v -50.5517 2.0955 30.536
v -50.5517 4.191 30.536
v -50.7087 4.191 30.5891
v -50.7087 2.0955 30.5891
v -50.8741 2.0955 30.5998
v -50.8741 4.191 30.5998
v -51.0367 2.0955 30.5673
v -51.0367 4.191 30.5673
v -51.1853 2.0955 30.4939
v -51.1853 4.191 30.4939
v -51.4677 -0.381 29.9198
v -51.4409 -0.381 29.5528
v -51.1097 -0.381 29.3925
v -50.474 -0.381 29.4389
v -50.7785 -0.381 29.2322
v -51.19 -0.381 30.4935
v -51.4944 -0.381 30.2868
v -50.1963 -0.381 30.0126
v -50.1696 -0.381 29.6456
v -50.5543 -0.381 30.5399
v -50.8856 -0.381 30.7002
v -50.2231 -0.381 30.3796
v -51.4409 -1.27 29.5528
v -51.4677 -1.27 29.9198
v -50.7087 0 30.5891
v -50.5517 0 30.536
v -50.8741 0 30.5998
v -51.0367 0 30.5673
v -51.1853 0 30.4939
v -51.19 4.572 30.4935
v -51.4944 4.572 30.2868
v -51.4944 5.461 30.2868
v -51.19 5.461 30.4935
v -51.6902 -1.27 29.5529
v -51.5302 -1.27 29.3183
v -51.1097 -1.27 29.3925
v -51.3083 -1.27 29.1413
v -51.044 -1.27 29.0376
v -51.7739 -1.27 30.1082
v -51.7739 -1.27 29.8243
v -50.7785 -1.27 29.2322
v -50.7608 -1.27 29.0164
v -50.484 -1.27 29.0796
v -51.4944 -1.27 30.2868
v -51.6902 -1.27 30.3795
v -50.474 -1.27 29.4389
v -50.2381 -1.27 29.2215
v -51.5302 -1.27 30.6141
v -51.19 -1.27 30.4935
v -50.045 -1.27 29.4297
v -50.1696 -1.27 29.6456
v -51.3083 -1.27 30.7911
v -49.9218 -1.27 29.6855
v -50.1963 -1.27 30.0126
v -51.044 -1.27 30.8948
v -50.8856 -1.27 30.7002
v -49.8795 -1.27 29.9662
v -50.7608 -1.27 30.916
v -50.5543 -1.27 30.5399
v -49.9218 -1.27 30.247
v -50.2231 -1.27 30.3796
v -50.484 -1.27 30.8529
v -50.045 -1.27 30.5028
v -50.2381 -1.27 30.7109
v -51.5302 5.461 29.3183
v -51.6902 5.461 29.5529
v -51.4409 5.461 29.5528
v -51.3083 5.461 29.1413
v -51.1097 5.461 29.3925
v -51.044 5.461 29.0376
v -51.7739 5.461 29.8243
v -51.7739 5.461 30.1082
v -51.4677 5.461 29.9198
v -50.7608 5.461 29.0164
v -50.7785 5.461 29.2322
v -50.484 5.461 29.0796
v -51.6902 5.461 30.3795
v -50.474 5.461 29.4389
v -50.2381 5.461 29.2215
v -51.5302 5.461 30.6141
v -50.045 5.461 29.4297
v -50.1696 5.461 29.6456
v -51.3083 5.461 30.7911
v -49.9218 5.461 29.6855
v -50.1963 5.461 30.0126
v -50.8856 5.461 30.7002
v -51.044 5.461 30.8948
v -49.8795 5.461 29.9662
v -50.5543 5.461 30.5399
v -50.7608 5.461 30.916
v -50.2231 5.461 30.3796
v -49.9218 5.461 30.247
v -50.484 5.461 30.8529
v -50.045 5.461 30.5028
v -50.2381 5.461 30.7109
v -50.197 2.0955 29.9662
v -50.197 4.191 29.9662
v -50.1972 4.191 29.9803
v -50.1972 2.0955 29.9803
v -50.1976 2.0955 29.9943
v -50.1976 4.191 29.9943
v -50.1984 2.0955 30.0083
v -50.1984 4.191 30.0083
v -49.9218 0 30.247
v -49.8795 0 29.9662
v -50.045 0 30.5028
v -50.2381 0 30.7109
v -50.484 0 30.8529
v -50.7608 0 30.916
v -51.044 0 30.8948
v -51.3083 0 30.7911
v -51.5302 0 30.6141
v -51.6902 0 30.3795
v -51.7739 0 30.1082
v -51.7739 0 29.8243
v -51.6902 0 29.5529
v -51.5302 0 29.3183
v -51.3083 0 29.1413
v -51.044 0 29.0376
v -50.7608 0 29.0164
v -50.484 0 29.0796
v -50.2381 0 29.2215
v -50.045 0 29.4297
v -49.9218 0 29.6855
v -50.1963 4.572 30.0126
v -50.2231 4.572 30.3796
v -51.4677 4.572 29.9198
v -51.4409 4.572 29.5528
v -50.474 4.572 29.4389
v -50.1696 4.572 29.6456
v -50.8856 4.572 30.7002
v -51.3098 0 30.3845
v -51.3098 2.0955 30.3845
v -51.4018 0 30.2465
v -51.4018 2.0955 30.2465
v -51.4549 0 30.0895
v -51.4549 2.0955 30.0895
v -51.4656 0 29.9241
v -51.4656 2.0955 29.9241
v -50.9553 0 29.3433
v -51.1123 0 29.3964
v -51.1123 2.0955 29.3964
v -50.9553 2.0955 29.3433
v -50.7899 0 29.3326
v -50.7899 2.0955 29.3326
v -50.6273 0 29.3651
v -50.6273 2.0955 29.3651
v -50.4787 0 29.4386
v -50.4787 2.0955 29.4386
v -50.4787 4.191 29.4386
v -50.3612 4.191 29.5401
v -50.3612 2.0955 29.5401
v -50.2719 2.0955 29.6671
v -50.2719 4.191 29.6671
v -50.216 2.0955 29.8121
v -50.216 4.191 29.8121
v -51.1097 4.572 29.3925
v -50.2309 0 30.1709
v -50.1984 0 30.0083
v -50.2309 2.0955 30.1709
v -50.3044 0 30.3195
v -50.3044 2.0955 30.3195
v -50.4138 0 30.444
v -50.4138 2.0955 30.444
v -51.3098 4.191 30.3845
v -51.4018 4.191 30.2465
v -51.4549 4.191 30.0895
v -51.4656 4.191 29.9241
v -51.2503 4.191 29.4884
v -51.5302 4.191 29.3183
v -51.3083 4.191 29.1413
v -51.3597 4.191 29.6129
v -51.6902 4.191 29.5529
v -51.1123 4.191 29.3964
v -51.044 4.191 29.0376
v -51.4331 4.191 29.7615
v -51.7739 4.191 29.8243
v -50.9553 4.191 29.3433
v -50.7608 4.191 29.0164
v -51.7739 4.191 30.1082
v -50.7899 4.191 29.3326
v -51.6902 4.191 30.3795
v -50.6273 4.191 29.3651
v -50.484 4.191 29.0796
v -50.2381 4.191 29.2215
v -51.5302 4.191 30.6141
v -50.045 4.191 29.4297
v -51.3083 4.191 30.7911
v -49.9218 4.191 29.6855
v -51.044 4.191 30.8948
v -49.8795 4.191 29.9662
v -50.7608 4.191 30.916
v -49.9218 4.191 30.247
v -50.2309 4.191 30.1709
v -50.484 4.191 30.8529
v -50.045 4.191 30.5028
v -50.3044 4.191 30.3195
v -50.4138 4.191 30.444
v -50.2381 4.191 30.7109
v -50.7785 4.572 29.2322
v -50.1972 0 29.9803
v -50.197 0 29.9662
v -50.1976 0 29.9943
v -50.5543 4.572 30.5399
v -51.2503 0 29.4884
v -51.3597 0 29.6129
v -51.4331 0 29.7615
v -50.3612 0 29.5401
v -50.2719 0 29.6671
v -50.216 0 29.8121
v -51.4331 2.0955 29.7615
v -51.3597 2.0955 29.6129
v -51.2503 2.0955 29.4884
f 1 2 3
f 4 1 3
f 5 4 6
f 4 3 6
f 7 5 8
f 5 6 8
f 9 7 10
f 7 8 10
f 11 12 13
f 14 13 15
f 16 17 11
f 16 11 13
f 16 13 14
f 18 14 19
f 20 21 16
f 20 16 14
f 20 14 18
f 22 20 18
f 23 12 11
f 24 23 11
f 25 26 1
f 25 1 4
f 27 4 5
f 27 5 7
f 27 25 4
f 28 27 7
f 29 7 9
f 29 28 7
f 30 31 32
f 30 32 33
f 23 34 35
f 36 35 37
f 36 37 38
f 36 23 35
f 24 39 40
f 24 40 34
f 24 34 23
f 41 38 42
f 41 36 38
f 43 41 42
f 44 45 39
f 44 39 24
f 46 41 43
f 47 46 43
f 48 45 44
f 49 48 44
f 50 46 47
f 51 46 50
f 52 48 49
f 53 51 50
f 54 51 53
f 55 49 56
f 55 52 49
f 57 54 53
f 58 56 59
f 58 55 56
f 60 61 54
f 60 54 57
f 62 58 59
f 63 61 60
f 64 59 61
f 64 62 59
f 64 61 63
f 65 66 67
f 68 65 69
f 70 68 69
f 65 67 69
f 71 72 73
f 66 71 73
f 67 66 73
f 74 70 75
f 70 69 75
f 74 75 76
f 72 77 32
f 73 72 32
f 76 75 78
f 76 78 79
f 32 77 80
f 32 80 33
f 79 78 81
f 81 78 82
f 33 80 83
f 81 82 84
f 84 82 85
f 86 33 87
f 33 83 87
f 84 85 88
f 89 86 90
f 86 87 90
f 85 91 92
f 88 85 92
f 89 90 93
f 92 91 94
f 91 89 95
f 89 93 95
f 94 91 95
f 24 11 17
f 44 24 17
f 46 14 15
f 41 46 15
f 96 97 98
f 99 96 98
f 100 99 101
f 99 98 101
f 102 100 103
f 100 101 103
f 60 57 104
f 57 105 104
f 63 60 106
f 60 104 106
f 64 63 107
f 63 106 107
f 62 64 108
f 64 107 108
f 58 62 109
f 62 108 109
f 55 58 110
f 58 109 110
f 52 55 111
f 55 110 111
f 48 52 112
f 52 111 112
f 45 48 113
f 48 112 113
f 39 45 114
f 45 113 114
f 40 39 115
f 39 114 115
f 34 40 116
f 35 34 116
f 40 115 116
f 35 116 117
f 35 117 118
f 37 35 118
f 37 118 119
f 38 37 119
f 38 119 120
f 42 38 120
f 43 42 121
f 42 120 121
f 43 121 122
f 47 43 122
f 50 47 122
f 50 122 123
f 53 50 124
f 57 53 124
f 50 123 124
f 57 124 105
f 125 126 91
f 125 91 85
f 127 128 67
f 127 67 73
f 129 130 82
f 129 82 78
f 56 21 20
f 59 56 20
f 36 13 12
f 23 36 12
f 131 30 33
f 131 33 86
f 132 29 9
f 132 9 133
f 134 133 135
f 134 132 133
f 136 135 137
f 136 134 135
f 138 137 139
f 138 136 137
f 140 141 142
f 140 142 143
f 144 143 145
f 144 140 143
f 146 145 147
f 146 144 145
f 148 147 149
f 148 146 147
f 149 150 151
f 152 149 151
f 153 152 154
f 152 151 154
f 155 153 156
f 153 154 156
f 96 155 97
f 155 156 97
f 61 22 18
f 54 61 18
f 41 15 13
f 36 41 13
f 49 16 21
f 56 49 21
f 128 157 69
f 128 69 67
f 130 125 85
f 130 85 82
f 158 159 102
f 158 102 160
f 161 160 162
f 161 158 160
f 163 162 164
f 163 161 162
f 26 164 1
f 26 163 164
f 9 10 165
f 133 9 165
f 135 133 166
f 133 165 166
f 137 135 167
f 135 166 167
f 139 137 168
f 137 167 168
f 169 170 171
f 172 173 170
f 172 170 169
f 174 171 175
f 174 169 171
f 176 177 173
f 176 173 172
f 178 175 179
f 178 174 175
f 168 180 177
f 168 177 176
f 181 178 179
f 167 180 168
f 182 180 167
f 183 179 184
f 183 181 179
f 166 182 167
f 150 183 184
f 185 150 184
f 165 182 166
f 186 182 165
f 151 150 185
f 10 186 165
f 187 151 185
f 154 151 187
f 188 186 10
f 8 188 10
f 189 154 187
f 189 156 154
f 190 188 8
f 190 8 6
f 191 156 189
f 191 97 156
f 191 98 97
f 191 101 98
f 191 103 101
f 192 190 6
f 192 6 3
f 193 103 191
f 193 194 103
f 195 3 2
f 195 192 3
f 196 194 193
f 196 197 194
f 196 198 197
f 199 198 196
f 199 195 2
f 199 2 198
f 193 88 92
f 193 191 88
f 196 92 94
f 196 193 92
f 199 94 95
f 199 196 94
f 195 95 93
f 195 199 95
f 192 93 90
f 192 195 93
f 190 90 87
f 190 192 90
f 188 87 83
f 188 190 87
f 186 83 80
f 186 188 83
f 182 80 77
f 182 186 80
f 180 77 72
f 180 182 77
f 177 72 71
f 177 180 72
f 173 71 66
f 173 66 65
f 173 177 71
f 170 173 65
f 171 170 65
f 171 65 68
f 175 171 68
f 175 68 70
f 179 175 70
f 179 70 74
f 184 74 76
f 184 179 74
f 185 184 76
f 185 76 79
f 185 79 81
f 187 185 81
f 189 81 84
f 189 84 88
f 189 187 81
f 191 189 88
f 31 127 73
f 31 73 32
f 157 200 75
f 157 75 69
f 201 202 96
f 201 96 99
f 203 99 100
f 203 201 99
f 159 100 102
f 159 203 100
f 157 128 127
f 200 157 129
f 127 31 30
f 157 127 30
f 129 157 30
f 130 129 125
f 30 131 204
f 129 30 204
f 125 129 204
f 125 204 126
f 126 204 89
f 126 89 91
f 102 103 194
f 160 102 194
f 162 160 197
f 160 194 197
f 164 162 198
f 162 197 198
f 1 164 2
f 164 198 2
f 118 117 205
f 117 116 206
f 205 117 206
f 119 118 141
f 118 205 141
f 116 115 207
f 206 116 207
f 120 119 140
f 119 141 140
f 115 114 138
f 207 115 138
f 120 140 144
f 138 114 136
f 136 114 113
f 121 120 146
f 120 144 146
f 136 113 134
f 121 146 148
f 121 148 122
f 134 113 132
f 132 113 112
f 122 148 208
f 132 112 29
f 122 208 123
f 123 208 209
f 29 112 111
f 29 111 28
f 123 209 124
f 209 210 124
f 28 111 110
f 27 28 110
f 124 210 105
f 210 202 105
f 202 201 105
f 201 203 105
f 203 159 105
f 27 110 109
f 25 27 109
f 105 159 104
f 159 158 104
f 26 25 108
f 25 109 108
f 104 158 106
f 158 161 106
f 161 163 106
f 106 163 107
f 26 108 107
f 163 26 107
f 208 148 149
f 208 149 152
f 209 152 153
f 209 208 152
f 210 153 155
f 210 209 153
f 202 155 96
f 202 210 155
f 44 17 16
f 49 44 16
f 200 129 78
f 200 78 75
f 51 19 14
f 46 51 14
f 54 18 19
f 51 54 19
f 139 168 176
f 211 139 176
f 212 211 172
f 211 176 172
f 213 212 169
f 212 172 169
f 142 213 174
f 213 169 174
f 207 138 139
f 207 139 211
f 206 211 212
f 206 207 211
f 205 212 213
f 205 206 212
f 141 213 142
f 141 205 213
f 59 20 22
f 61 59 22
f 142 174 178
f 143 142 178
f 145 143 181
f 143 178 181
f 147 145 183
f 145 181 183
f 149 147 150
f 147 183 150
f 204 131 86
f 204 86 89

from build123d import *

# Parameters (mm, degrees)
F1_DEPTH = 2.0955
F0_R     = 0.9525
F2_DEPTH = 0.381
F3_R     = 0.9525
F4_DEPTH = 0.889


with BuildPart() as f1:
    # F0 (on Front) → F1 (new body)
    with BuildSketch(Plane.XZ):
        with BuildLine():
            ThreePointArc((-50.4787408751, 29.4385525432), (-50.27185395, 29.6671320557), (-50.1970108056, 29.9662128091))
            ThreePointArc((-50.1970108056, 29.9662128091), (-50.1973603622, 29.9872797188), (-50.1984086471, 30.0083234346))
            ThreePointArc((-50.1984086471, 30.0083234346), (-50.3043505199, 30.31948271), (-50.5516784903, 30.5359836341))
            ThreePointArc((-50.5516784903, 30.5359836341), (-50.8741213768, 30.5998149712), (-51.1852807654, 30.4938730554))
            ThreePointArc((-51.1852807654, 30.4938730554), (-51.4017816859, 30.246545012), (-51.4656129641, 29.9241021836))
            ThreePointArc((-51.4656129641, 29.9241021836), (-51.3596710927, 29.6129429103), (-51.1123431255, 29.3964419864))
            ThreePointArc((-51.1123431255, 29.3964419864), (-50.7899002546, 29.3326106457), (-50.4787408751, 29.4385525432))
        make_face()
    extrude(amount=-F1_DEPTH)

    # F0 (on Front) → F2 (join)
    with BuildSketch(Plane.XZ):
        with Locations((-50.8320108056, 29.9662128091)):
            Circle(F0_R)
        Polygon((-50.2227212209, 30.3741338006), (-50.1984086471, 30.0083234346), (-50.1740960719, 29.6425130463), (-50.4787408751, 29.4385525432), (-50.7833856565, 29.2345920547), (-51.1123431255, 29.3964419864), (-51.4413003903, 29.5582918175), (-51.4656129641, 29.9241021836), (-51.4899255394, 30.2899125719), (-51.1852807654, 30.4938730554), (-50.8806359547, 30.6978335634), (-50.5516784903, 30.5359836341), align=None, mode=Mode.SUBTRACT)
        with BuildLine():
            ThreePointArc((-50.4787408751, 29.4385525432), (-50.27185395, 29.6671320557), (-50.1970108056, 29.9662128091))
            ThreePointArc((-50.1970108056, 29.9662128091), (-50.1973603622, 29.9872797188), (-50.1984086471, 30.0083234346))
            ThreePointArc((-50.1984086471, 30.0083234346), (-50.3043505199, 30.31948271), (-50.5516784903, 30.5359836341))
            ThreePointArc((-50.5516784903, 30.5359836341), (-50.8741213768, 30.5998149712), (-51.1852807654, 30.4938730554))
            ThreePointArc((-51.1852807654, 30.4938730554), (-51.4017816859, 30.246545012), (-51.4656129641, 29.9241021836))
            ThreePointArc((-51.4656129641, 29.9241021836), (-51.3596710927, 29.6129429103), (-51.1123431255, 29.3964419864))
            ThreePointArc((-51.1123431255, 29.3964419864), (-50.7899002546, 29.3326106457), (-50.4787408751, 29.4385525432))
        make_face()
        with BuildLine():
            ThreePointArc((-50.1984086471, 30.0083234346), (-50.1973603622, 29.9872797188), (-50.1970108056, 29.9662128091))
            ThreePointArc((-50.1970108056, 29.9662128091), (-50.27185395, 29.6671320557), (-50.4787408751, 29.4385525432))
            Line((-50.4787408751, 29.4385525432), (-50.1740960719, 29.6425130463))
            Line((-50.1740960719, 29.6425130463), (-50.1984086471, 30.0083234346))
        make_face()
        with BuildLine():
            ThreePointArc((-50.5516784903, 30.5359836341), (-50.3043505199, 30.31948271), (-50.1984086471, 30.0083234346))
            Line((-50.1984086471, 30.0083234346), (-50.2227212209, 30.3741338006))
            Line((-50.2227212209, 30.3741338006), (-50.5516784903, 30.5359836341))
        make_face()
        with BuildLine():
            Line((-50.7833856565, 29.2345920547), (-50.4787408751, 29.4385525432))
            ThreePointArc((-50.4787408751, 29.4385525432), (-50.7899002546, 29.3326106457), (-51.1123431255, 29.3964419864))
            Line((-51.1123431255, 29.3964419864), (-50.7833856565, 29.2345920547))
        make_face()
        with BuildLine():
            ThreePointArc((-51.1852807654, 30.4938730554), (-50.8741213768, 30.5998149712), (-50.5516784903, 30.5359836341))
            Line((-50.5516784903, 30.5359836341), (-50.8806359547, 30.6978335634))
            Line((-50.8806359547, 30.6978335634), (-51.1852807654, 30.4938730554))
        make_face()
        with BuildLine():
            Line((-51.4413003903, 29.5582918175), (-51.1123431255, 29.3964419864))
            ThreePointArc((-51.1123431255, 29.3964419864), (-51.3596710927, 29.6129429103), (-51.4656129641, 29.9241021836))
            Line((-51.4656129641, 29.9241021836), (-51.4413003903, 29.5582918175))
        make_face()
        with BuildLine():
            ThreePointArc((-51.4656129641, 29.9241021836), (-51.4017816859, 30.246545012), (-51.1852807654, 30.4938730554))
            Line((-51.1852807654, 30.4938730554), (-51.4899255394, 30.2899125719))
            Line((-51.4899255394, 30.2899125719), (-51.4656129641, 29.9241021836))
        make_face()
    extrude(amount=F2_DEPTH)

    # F3 (on face) → F4 (join)
    with BuildSketch(Plane.XZ.offset(0.381)):
        with Locations((-50.8320108056, 29.9662128091)):
            Circle(F3_R)
        Polygon((-50.2231179997, 30.3795862702), (-50.1963452388, 30.012584543), (-50.1695724841, 29.6455829016), (-50.4740186105, 29.4388963588), (-50.77846529, 29.2322094405), (-51.1096844946, 29.3925244155), (-51.4409036115, 29.552839348), (-51.4676763724, 29.9198410751), (-51.4944491271, 30.2868427166), (-51.1900030005, 30.4935292595), (-50.8855563212, 30.7002161777), (-50.5543371681, 30.5399012276), align=None, mode=Mode.SUBTRACT)
    extrude(amount=F4_DEPTH)

    # F5: F1 across face


with BuildPart() as f1_1:
    add(f1.part)
    add(f1.part.mirror(Plane(origin=(-50.8320108056, 2.0955, 29.9662128091), x_dir=(1, 0, 0), z_dir=(0, 1, 0))))


solid = f1_1.part
